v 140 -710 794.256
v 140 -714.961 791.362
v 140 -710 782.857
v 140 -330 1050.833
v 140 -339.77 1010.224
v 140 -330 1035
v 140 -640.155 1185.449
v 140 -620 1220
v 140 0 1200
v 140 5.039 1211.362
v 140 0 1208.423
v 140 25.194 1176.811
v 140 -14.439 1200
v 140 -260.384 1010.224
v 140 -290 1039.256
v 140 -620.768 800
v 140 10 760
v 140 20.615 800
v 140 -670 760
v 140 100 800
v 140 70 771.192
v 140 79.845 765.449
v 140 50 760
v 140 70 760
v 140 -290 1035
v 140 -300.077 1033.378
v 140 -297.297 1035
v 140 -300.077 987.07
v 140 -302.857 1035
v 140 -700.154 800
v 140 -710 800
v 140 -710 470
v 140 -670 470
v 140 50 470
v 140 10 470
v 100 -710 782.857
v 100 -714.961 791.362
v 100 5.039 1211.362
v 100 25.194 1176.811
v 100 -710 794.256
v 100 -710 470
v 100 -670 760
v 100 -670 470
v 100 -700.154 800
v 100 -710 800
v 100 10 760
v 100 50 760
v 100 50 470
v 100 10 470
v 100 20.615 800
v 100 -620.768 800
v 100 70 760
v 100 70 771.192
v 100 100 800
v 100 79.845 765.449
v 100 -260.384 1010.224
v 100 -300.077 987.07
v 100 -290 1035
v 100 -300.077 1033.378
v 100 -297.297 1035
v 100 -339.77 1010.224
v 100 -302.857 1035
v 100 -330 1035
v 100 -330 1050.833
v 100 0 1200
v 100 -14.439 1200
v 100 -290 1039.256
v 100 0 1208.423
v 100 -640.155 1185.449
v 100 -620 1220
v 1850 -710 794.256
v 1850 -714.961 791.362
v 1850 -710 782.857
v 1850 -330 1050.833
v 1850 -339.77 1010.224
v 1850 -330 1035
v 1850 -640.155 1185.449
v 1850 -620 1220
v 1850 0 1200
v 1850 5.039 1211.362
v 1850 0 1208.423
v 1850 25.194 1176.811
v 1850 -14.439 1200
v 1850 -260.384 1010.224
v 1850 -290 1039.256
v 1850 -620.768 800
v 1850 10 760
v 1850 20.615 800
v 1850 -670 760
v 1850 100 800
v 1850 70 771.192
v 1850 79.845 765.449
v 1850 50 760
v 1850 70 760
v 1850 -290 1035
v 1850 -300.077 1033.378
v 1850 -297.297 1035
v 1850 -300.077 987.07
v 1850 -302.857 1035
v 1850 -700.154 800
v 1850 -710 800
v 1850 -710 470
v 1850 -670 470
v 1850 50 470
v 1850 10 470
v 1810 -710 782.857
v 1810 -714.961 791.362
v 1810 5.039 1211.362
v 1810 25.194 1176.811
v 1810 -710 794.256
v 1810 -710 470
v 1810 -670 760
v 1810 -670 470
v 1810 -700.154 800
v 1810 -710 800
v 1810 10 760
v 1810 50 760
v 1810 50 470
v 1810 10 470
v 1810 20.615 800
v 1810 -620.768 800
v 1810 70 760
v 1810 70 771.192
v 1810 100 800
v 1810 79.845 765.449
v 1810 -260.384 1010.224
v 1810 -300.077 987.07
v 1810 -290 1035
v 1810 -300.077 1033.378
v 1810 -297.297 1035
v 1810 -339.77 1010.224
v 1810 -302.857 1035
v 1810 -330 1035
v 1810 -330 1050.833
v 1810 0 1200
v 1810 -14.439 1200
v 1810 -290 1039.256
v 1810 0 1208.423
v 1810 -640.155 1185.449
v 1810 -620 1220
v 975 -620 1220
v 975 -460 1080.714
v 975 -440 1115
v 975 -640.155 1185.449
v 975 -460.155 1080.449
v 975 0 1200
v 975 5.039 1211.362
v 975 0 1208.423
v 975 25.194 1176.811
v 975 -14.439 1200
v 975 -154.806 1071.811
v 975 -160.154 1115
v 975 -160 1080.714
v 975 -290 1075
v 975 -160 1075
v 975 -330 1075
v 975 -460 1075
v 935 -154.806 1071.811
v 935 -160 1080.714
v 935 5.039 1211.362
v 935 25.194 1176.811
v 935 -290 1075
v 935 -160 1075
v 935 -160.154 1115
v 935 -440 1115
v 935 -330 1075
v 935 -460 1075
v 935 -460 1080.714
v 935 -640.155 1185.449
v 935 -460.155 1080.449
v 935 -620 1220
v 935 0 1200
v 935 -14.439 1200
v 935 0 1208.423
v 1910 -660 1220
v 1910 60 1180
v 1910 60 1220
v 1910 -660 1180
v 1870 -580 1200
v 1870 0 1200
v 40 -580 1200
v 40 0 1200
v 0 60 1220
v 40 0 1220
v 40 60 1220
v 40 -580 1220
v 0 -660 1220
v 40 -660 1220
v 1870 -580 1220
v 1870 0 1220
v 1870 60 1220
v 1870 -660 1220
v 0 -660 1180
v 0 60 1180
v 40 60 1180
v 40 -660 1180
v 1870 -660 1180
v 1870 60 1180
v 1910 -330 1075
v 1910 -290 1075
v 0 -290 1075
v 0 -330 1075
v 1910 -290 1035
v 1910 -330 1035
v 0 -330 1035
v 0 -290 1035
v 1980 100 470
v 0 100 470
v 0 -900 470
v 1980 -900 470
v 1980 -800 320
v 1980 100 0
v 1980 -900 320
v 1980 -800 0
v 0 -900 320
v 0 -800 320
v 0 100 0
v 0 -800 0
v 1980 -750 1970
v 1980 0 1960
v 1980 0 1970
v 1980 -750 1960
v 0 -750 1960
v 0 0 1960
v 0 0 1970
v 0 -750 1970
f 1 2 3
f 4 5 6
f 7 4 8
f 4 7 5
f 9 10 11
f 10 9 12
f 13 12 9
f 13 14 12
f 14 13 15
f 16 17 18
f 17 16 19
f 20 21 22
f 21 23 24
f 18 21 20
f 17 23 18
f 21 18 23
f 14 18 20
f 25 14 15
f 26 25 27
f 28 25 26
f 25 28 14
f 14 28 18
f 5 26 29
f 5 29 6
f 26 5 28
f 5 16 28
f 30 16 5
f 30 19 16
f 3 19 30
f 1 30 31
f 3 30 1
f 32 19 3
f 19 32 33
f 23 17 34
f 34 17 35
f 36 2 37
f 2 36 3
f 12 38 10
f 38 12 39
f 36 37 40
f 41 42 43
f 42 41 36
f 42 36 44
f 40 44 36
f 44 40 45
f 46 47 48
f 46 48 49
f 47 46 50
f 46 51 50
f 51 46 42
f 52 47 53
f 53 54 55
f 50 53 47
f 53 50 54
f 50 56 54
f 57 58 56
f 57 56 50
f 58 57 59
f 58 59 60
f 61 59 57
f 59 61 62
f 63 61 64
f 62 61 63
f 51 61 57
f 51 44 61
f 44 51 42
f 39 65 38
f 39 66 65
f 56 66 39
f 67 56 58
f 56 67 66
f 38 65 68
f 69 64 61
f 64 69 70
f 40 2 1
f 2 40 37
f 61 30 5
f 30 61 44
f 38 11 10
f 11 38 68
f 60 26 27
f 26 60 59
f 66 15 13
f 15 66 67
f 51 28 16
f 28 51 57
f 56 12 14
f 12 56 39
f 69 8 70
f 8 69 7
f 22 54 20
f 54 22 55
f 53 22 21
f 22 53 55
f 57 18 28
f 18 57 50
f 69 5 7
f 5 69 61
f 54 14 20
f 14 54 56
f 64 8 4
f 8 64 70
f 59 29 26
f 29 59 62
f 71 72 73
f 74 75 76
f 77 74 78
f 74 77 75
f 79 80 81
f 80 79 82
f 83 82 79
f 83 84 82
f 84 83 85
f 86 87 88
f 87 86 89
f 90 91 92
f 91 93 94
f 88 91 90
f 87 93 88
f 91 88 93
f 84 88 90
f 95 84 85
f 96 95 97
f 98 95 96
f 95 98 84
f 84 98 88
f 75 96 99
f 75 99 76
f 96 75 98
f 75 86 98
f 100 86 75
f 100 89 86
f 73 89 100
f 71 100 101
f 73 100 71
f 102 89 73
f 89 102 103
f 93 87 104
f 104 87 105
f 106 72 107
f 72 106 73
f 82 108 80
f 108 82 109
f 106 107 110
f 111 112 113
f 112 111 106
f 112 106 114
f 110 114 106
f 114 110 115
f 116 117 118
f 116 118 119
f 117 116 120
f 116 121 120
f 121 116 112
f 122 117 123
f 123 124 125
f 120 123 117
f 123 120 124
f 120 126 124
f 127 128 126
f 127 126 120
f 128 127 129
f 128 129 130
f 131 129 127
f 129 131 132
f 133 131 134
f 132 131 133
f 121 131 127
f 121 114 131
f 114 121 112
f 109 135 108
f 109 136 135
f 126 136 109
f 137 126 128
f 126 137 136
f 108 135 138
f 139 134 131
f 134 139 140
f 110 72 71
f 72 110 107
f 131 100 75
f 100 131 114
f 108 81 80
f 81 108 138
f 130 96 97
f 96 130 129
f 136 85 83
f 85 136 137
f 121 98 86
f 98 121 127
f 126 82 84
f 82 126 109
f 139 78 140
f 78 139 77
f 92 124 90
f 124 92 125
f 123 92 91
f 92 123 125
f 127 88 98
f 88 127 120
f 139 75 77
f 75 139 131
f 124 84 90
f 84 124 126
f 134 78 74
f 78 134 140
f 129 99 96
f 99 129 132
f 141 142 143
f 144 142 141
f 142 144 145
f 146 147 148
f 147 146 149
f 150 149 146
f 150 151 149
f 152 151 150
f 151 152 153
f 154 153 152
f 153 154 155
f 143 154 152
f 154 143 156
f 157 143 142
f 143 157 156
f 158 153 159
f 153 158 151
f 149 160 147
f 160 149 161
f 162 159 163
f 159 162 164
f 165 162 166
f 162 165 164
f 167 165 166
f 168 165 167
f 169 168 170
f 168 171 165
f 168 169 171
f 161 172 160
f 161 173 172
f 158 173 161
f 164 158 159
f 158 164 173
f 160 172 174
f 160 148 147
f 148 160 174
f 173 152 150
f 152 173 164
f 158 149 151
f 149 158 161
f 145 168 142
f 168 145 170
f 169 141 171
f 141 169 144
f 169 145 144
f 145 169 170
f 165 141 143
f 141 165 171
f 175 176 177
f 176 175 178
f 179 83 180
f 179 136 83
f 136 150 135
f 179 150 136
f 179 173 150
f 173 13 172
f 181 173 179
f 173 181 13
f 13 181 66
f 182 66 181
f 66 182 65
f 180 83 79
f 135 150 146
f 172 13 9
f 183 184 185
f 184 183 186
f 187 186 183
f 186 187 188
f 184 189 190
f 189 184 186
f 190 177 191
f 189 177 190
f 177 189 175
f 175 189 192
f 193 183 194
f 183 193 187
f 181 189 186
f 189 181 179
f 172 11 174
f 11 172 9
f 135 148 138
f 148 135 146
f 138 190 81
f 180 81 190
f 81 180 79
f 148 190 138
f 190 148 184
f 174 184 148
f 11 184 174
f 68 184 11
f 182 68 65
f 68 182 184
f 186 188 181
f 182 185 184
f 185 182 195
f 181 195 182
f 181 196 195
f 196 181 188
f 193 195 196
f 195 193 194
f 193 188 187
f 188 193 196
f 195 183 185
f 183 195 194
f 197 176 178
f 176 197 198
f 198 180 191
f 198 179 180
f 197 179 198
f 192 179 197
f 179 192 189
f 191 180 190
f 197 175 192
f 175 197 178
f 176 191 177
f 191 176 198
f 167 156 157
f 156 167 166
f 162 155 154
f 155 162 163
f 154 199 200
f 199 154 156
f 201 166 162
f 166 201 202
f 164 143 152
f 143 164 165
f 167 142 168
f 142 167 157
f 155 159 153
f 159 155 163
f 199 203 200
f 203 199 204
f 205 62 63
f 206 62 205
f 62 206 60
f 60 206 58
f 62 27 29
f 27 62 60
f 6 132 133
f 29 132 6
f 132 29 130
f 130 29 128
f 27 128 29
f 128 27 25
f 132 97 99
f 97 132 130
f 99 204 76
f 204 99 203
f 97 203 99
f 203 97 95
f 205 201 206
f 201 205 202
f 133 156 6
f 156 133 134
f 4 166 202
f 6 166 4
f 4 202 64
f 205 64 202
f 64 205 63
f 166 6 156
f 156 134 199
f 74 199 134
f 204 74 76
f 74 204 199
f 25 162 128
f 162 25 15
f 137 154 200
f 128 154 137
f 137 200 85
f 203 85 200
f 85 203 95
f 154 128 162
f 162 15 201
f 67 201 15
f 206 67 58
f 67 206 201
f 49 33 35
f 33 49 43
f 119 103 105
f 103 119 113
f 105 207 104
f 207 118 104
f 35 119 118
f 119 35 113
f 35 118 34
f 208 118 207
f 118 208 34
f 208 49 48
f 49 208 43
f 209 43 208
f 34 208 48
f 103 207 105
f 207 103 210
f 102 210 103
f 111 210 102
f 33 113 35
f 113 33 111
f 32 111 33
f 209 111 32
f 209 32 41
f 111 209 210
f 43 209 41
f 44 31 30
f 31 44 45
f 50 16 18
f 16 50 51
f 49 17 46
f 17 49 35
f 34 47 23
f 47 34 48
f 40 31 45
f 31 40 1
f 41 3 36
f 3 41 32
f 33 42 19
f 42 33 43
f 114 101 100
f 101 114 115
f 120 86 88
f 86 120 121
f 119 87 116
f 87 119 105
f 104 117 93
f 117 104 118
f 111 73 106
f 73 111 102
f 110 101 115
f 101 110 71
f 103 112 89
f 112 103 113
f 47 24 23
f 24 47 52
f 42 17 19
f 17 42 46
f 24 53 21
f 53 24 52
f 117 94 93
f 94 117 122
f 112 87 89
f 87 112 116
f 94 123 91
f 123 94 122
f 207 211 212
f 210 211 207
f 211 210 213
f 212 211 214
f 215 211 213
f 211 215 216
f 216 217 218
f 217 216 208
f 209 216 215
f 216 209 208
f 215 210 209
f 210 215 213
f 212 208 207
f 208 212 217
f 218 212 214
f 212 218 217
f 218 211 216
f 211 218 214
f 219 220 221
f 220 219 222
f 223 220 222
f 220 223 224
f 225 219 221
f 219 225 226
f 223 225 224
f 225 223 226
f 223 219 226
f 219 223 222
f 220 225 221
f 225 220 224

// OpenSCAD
// Wohnwagen Hochbett aus Feldbett
// http://www.thingiverse.com/thing:1393879

Feldbett_Laenge = 191; // [180:220]
Feldbett_Breite = 72; // [50:90]
Feldbett_Hoehe = 42; // [30:50]
Feldbett_Rahmen = 4; // [3:8]
Feldbett_B_Abstand = 3; // [1:10]
Feldbett_L_Abstand = 6; // [1:10]
Rahmen_H_Prozent = 25; // [10:50]
Rahmen_M_Breite = 30; // [50:90]
Rahmen_H_Hoehe = 75; // [50:120]
WoWa_B_Abstand = 10; // [0:50]
WoWa_Hoehe = 150; // [130:190]
WoWa_Laenge = 198; // [180:240]
WoWa_Breite = 100; // [60:140]

bl=10*Feldbett_Laenge;
bb=10*Feldbett_Breite;
bh=10*Feldbett_Hoehe;
br=10*Feldbett_Rahmen;
ba=10*Feldbett_B_Abstand;
bf=10*Feldbett_L_Abstand;
bd = sqrt(bb*bb+bh*bh); // Fuss
bw = asin((bb)/bd); // Winkel

rf=0.01*Rahmen_H_Prozent;
rl=10*Rahmen_M_Breite;
rh=10*Rahmen_H_Hoehe-bh;
wa=10*WoWa_B_Abstand;
wh=10*WoWa_Hoehe;
wl=10*WoWa_Laenge;
wb=10*WoWa_Breite;

translate([0,0,bh+320+rh+150])
rotate([180,0,0])
wowa_hochbett();

module wowa_hochbett() {
color ("green") bett();
color ("red") gestell();
color ("yellow") wowa();
}

module wowa() {
translate([0,-wa,rh+bh])
cube([wl,wb,150]);
translate([0,-wa,rh+bh])
cube([wl,wb-100,320+150]);
translate([0,0,rh+bh-wh])
cube([wl,wb-250,10]);
}

module gestell() {
// Gestell Mitte
translate([0,(bb-rl)/2,0])
translate([(bl-br)/2,-ba-br/2,bh*rf])
cube([br,rl,br]);
translate([0,(bb)/2-ba-br,bh*rf+br])
cube([bl,br,br]);
// Gestell Unten
translate([bf+br,-ba-br/2,bh])
cube([br,br,rh]);
translate([bf+br,bb-ba-br/2,bh])
cube([br,br,rh]);
translate([bl-bf-br,-ba-br/2,bh])
cube([br,br,rh]);
translate([bl-bf-br,bb-ba-br/2,bh])
cube([br,br,rh]);
// Gestell Querstange
translate([bf+br,-ba-br,bh])
cube([br,bb+ba*2,br]);
translate([bl-bf-br,-ba-br,bh])
cube([br,bb+ba*2,br]);
}

module bett() {
// Liegeflaeche
cube ([bl,bb-2*(br+ba),br/2]);
// Bretter
translate([0,-ba*2,0]) 
cube ([br,bb,br]);
translate([bl-br,-ba*2,0]) 
cube ([br,bb,br]);
// Fuesse
translate([bf+br,0,0]) bettfuss();
translate([bl-bf-br,0,0]) bettfuss();
translate([(bl-br)/2,0,0]) bettfuss(0.25);
}

module bettfuss(pl=1) {
// Fuss1
rotate ([-bw,0,0])
translate([0,-ba-br/2,0])
cube([br,br,bd*pl]);
// Fuss2
translate([0,bb-ba*2-br,0])
rotate ([bw,0,0])
cube([br,br,bd*pl]);
}
